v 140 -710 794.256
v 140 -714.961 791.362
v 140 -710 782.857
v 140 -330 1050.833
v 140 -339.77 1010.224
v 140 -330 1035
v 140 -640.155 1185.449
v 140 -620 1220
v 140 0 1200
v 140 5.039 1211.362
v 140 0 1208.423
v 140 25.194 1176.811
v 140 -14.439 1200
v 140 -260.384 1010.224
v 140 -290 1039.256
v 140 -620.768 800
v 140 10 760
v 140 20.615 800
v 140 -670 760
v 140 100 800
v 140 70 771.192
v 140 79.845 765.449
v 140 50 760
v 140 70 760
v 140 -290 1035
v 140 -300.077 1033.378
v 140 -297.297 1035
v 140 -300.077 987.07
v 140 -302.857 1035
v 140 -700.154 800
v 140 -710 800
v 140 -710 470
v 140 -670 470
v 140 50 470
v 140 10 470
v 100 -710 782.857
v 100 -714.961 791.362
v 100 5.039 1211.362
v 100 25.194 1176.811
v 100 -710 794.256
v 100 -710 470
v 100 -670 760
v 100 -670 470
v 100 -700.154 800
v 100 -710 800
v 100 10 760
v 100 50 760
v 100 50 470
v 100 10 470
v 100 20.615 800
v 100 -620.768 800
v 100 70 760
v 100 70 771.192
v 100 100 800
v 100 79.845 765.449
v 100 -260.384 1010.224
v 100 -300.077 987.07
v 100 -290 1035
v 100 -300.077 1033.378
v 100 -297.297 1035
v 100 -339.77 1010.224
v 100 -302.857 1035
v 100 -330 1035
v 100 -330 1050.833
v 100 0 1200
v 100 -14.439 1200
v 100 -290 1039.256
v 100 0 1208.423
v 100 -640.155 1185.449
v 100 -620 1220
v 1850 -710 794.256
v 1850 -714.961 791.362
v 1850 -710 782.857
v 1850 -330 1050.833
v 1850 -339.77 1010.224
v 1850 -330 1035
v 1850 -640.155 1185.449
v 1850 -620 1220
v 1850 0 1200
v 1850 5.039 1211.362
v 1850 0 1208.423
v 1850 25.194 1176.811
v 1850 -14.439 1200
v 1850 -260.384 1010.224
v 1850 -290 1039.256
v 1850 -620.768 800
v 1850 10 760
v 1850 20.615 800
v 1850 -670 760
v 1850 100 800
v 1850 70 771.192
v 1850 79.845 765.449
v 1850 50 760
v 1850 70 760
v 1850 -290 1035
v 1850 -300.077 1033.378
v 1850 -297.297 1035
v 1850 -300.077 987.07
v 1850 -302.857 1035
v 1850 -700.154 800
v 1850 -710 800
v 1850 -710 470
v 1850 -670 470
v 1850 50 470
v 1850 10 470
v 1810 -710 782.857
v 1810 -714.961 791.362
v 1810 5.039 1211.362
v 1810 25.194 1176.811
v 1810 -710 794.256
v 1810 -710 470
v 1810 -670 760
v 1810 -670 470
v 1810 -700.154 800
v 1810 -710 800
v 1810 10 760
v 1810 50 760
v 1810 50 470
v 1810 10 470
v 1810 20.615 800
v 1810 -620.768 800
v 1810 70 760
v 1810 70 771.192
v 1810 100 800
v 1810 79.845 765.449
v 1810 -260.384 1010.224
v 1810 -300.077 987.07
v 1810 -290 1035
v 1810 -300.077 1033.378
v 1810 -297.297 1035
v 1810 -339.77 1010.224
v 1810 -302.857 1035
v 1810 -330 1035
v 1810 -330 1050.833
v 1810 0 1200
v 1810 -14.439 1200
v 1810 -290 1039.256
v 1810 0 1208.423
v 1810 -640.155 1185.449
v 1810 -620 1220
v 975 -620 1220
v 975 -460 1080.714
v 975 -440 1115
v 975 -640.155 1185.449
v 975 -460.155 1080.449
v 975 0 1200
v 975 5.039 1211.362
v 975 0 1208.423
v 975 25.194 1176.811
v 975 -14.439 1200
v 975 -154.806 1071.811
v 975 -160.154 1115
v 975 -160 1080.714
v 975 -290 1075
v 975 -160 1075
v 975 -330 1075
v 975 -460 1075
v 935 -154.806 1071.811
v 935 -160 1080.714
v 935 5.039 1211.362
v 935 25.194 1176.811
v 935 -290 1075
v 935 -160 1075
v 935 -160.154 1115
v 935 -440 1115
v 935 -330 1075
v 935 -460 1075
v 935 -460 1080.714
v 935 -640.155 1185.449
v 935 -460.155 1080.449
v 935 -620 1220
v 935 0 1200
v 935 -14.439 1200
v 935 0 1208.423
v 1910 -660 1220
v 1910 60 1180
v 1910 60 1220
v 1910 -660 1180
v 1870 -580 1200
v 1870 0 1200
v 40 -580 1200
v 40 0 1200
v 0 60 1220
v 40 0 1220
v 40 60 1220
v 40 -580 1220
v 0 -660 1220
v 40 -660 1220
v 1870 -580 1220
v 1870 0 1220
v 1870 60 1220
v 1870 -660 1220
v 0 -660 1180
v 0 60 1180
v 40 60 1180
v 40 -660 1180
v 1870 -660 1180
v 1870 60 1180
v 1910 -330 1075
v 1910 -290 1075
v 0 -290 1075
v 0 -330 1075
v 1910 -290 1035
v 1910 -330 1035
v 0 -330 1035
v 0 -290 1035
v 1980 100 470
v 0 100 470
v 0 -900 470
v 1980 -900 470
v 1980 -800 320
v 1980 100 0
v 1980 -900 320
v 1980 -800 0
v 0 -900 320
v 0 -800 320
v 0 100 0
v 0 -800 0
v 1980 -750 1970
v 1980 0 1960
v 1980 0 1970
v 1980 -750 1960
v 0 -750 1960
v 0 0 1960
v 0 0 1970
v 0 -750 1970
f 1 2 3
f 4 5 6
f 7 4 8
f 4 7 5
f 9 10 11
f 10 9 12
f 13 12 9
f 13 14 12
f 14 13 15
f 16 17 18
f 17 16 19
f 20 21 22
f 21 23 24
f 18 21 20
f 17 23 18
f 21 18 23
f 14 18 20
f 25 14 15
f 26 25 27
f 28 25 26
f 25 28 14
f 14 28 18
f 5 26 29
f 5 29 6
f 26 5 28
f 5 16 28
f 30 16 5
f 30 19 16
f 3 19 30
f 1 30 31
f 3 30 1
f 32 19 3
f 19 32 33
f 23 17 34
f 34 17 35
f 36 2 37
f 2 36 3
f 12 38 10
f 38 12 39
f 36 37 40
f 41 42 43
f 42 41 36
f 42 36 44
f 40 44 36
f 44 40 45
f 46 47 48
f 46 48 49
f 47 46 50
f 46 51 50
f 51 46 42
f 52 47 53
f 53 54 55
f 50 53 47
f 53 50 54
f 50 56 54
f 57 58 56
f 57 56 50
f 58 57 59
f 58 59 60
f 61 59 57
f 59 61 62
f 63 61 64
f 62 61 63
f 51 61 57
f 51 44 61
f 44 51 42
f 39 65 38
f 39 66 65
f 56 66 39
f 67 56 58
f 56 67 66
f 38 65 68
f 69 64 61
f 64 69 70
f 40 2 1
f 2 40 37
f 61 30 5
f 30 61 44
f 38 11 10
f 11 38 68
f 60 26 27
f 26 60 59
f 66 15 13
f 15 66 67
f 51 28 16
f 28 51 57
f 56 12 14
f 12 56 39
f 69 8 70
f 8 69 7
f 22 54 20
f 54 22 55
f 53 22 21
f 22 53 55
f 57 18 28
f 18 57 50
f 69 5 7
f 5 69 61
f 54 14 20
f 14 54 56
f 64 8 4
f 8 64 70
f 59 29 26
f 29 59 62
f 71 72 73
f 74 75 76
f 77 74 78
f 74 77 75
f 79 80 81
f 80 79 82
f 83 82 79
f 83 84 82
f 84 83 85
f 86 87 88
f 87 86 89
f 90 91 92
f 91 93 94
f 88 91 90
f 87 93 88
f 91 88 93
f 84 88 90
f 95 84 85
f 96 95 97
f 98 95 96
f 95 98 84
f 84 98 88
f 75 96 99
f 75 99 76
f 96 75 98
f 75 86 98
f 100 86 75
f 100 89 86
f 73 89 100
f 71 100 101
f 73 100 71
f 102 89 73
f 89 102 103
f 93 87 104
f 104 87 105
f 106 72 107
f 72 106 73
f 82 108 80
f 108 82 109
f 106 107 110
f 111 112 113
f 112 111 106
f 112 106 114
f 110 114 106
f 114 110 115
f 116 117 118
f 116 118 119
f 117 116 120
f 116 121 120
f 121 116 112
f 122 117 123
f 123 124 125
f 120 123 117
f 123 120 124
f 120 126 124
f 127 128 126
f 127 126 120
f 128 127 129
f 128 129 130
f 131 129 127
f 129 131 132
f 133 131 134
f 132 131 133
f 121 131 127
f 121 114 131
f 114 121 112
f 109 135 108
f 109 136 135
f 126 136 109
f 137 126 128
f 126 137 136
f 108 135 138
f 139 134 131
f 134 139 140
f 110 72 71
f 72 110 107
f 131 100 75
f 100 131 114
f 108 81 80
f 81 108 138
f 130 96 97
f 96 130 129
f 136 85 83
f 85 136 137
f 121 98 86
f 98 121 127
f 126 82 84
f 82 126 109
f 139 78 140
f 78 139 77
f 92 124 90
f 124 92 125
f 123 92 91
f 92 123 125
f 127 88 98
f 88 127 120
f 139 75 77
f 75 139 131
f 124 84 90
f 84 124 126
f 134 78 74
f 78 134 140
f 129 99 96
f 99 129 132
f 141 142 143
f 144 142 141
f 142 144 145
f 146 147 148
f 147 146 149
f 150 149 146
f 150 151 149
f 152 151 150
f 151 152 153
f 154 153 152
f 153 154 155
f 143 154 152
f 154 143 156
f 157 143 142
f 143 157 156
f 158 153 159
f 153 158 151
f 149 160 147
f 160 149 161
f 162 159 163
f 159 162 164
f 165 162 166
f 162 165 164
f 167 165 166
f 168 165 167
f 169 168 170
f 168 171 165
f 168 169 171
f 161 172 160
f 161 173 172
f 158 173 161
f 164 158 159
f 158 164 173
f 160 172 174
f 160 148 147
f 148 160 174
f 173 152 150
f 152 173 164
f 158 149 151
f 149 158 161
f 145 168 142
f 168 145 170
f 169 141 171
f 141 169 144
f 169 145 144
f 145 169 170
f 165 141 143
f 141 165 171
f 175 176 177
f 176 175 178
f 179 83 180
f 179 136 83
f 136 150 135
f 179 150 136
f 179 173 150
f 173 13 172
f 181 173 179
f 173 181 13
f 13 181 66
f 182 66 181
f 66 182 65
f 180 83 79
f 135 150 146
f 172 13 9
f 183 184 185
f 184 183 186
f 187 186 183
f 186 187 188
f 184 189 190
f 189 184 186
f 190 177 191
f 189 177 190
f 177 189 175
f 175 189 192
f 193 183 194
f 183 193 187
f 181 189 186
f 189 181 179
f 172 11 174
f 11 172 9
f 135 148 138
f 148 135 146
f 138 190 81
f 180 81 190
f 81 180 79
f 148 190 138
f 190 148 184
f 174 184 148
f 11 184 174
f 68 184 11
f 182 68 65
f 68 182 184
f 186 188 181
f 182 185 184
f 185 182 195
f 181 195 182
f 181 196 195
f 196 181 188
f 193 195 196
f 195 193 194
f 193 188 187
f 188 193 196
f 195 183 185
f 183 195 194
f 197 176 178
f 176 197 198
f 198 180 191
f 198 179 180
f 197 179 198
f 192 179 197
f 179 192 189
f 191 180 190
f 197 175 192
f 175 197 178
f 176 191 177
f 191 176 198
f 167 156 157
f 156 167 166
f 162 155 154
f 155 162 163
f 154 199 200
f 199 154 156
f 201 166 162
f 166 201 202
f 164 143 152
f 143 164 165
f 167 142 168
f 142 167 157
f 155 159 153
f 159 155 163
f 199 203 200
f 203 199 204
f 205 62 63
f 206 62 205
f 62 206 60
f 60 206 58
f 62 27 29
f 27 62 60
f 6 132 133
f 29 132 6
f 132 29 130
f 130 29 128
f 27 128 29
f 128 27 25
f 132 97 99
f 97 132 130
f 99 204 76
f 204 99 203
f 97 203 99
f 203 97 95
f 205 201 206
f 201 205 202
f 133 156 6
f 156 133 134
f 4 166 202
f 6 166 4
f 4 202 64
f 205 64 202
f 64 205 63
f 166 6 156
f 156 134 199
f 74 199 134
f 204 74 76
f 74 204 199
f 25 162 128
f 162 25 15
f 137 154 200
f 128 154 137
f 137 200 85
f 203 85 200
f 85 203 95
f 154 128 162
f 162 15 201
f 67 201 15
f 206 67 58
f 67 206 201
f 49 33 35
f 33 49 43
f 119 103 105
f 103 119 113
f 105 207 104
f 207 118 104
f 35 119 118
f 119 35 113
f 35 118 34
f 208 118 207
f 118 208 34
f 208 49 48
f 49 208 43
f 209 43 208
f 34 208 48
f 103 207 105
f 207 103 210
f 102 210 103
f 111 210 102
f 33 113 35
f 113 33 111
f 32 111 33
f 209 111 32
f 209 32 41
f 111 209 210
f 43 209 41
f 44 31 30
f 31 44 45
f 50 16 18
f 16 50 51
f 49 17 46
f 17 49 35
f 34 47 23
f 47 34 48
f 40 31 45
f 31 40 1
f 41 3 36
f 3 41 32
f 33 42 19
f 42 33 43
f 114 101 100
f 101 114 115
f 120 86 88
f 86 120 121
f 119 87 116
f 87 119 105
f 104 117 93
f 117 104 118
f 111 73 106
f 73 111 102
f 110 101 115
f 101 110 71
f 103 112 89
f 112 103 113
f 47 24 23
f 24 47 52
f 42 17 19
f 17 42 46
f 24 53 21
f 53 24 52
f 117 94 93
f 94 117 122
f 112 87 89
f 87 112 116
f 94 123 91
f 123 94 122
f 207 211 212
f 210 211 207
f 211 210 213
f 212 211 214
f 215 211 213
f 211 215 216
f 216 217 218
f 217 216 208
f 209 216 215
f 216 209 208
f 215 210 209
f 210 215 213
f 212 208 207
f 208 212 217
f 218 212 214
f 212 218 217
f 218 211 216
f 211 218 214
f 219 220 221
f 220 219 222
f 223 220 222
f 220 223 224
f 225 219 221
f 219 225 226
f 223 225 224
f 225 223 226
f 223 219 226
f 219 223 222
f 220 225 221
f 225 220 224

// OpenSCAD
// Wohnwagen Hochbett aus Feldbett
// http://www.thingiverse.com/thing:1393879

Feldbett_Laenge = 191; // [180:220]
Feldbett_Breite = 72; // [50:90]
Feldbett_Hoehe = 42; // [30:50]
Feldbett_Rahmen = 4; // [3:8]
Feldbett_B_Abstand = 3; // [1:10]
Feldbett_L_Abstand = 6; // [1:10]
Rahmen_H_Prozent = 25; // [10:50]
Rahmen_M_Breite = 30; // [50:90]
Rahmen_H_Hoehe = 75; // [50:120]
WoWa_B_Abstand = 10; // [0:50]
WoWa_Hoehe = 150; // [130:190]
WoWa_Laenge = 198; // [180:240]
WoWa_Breite = 100; // [60:140]

bl=10*Feldbett_Laenge;
bb=10*Feldbett_Breite;
bh=10*Feldbett_Hoehe;
br=10*Feldbett_Rahmen;
ba=10*Feldbett_B_Abstand;
bf=10*Feldbett_L_Abstand;
bd = sqrt(bb*bb+bh*bh); // Fuss
bw = asin((bb)/bd); // Winkel

rf=0.01*Rahmen_H_Prozent;
rl=10*Rahmen_M_Breite;
rh=10*Rahmen_H_Hoehe-bh;
wa=10*WoWa_B_Abstand;
wh=10*WoWa_Hoehe;
wl=10*WoWa_Laenge;
wb=10*WoWa_Breite;

translate([0,0,bh+320+rh+150])
rotate([180,0,0])
wowa_hochbett();

module wowa_hochbett() {
color ("green") bett();
color ("red") gestell();
color ("yellow") wowa();
}

module wowa() {
translate([0,-wa,rh+bh])
cube([wl,wb,150]);
translate([0,-wa,rh+bh])
cube([wl,wb-100,320+150]);
translate([0,0,rh+bh-wh])
cube([wl,wb-250,10]);
}

module gestell() {
// Gestell Mitte
translate([0,(bb-rl)/2,0])
translate([(bl-br)/2,-ba-br/2,bh*rf])
cube([br,rl,br]);
translate([0,(bb)/2-ba-br,bh*rf+br])
cube([bl,br,br]);
// Gestell Unten
translate([bf+br,-ba-br/2,bh])
cube([br,br,rh]);
translate([bf+br,bb-ba-br/2,bh])
cube([br,br,rh]);
translate([bl-bf-br,-ba-br/2,bh])
cube([br,br,rh]);
translate([bl-bf-br,bb-ba-br/2,bh])
cube([br,br,rh]);
// Gestell Querstange
translate([bf+br,-ba-br,bh])
cube([br,bb+ba*2,br]);
translate([bl-bf-br,-ba-br,bh])
cube([br,bb+ba*2,br]);
}

module bett() {
// Liegeflaeche
cube ([bl,bb-2*(br+ba),br/2]);
// Bretter
translate([0,-ba*2,0]) 
cube ([br,bb,br]);
translate([bl-br,-ba*2,0]) 
cube ([br,bb,br]);
// Fuesse
translate([bf+br,0,0]) bettfuss();
translate([bl-bf-br,0,0]) bettfuss();
translate([(bl-br)/2,0,0]) bettfuss(0.25);
}

module bettfuss(pl=1) {
// Fuss1
rotate ([-bw,0,0])
translate([0,-ba-br/2,0])
cube([br,br,bd*pl]);
// Fuss2
translate([0,bb-ba*2-br,0])
rotate ([bw,0,0])
cube([br,br,bd*pl]);
}
